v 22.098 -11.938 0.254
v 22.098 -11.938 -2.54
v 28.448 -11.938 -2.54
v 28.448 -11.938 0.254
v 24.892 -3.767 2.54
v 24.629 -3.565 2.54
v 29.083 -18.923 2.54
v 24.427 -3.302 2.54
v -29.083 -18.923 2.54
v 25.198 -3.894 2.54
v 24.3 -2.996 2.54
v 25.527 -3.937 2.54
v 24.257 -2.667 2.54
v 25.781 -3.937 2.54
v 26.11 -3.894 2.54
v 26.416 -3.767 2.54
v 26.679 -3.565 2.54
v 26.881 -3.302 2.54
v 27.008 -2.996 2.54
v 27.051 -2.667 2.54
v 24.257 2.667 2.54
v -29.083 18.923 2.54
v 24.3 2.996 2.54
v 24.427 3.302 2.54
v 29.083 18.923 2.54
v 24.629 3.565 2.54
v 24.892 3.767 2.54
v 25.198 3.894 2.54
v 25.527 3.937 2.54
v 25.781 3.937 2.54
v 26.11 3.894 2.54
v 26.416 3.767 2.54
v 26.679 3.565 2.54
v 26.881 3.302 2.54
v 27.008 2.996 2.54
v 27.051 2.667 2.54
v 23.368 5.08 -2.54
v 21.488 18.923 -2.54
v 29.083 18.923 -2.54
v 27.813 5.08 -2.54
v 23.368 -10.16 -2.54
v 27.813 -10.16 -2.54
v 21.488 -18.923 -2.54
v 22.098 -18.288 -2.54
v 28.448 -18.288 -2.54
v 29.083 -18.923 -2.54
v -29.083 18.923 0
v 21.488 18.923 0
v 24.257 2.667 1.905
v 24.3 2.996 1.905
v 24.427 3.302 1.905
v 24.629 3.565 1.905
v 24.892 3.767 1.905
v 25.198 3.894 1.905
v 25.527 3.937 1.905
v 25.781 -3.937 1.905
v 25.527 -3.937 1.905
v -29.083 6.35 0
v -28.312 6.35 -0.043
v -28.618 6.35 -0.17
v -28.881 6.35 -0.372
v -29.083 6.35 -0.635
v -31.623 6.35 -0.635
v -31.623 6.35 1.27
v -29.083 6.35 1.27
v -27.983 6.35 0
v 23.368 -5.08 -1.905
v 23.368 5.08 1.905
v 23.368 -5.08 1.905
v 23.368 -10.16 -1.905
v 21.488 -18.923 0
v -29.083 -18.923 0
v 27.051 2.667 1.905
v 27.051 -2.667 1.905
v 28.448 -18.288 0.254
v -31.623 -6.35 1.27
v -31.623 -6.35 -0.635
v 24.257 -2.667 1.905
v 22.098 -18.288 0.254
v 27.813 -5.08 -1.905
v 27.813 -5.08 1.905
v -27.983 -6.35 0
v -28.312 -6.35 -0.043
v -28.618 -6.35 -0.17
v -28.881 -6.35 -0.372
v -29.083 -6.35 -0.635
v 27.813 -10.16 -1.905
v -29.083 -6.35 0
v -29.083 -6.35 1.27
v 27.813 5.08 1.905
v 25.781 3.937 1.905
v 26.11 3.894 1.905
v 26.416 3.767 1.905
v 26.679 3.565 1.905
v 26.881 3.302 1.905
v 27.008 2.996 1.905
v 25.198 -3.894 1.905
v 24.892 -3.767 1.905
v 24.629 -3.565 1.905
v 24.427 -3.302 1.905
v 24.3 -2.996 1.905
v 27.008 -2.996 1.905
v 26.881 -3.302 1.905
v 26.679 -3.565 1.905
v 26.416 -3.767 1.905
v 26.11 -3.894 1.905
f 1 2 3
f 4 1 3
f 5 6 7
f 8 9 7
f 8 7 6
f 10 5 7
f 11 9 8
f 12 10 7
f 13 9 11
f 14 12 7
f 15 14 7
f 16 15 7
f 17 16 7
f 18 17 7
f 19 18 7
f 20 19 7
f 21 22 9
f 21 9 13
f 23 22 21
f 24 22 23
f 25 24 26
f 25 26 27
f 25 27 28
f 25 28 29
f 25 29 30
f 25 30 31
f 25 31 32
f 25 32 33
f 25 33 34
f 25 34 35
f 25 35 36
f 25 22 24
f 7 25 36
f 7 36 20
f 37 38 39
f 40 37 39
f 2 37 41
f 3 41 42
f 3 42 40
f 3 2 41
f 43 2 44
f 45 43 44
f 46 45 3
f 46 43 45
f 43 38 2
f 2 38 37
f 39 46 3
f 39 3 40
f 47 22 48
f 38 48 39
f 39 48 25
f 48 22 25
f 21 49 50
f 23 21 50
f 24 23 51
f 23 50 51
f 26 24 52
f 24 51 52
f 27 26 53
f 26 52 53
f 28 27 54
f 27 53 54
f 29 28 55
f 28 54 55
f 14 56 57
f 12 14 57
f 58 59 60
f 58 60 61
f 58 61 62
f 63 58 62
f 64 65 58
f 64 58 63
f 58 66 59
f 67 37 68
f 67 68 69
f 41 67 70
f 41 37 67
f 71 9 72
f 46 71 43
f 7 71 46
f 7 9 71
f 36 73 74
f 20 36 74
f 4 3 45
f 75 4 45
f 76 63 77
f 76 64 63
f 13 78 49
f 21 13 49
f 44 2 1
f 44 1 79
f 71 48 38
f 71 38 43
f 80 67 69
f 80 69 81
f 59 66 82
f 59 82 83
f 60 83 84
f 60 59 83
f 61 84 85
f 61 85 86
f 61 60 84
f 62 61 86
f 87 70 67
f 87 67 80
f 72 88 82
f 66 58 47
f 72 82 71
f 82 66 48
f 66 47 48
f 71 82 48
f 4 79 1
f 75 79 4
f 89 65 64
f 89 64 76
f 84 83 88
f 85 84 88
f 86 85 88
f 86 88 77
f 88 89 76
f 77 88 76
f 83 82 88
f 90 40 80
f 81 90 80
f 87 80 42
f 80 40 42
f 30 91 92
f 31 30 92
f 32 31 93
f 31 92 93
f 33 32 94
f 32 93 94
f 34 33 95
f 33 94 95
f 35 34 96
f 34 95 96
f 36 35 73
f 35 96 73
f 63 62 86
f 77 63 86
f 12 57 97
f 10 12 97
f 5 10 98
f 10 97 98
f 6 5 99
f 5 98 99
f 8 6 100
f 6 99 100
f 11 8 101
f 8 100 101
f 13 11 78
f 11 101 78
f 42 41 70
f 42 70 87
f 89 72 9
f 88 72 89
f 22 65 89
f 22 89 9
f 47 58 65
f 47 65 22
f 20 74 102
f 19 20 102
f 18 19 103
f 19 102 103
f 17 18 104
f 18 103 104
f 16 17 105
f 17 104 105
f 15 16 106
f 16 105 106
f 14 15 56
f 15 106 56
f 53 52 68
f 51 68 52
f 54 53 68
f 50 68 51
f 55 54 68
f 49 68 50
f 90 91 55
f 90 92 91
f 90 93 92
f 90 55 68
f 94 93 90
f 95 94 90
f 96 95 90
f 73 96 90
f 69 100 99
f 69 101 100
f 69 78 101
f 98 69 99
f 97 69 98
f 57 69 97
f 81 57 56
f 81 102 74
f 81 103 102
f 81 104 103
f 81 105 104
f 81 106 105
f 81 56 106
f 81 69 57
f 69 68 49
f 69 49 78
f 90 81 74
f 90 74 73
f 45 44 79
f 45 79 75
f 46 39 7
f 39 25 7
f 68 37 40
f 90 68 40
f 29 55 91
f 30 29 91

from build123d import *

# Parameters (mm, degrees)
F0_W        = 58.166
F0_H        = 37.846
F1_DEPTH    = 2.54
F2_W        = 7.5946
F2_H        = 37.846
F3_DEPTH    = 2.54
F4_W        = 12.7
F4_H        = 0.635
F4_H_2      = 1.27
F5_DEPTH    = 2.54
F6_T1_DEPTH = 12.7
F7_W        = 4.445
F7_H        = 10.16
F8_DEPTH    = 4.445
F9_W        = 4.445
F9_H        = 5.08
F10_DEPTH   = 0.635
F12_DEPTH   = 0.635
F13_W       = 6.35
F13_H       = 6.35
F14_DEPTH   = 2.794


# Not quite as in the source:
# - a fillet or chamfer that OpenCascade refuses, or shapes differently, is made with other operations: its cross-section is extruded or revolved along the edge and cut away or added


with BuildPart() as f1:
    # F0 (on Top) → F1 (new body)
    with BuildSketch(Plane.XY):
        Rectangle(F0_W, F0_H)
    extrude(amount=F1_DEPTH)

    # F2 (on face) → F3 (join)
    with BuildSketch(Plane(origin=(0, 0, 0), x_dir=(1, 0, 0), z_dir=(0, 0, -1))):
        with Locations((25.2857, 0)):
            Rectangle(F2_W, F2_H)
    extrude(amount=F3_DEPTH)

    # F4 (on face) → F5 (join)
    with BuildSketch(Plane(origin=(-29.083, 0, 0), x_dir=(0, -1, 0), z_dir=(-1, 0, 0))):
        with Locations((0, -0.3175)):
            Rectangle(F4_W, F4_H)
        with Locations((0, 0.635)):
            Rectangle(F4_W, F4_H_2)
    extrude(amount=F5_DEPTH)

    # F6: fillet of radius 1.27 on 1 edges, made by hand

    # F6_s2 → F6_t1 (join)
    with BuildSketch(Plane.XZ.offset(-6.35)):
        with BuildLine():
            ThreePointArc((-27.9831477372, 0), (-28.6181477372, -0.1701477372), (-29.083, -0.635))
            Line((-29.083, -0.635), (-29.083, 0))
            Line((-29.083, 0), (-27.9831477372, 0))
        make_face()
    extrude(amount=F6_T1_DEPTH)

    # F7 (on face) → F8 (cut)
    with BuildSketch(Plane(origin=(0, 0, -2.54), x_dir=(1, 0, 0), z_dir=(0, 0, -1))):
        with Locations((25.5905, 0)):
            Rectangle(F7_W, F7_H)
    extrude(amount=-F8_DEPTH, mode=Mode.SUBTRACT)

    # F9 (on face) → F10 (cut)
    with BuildSketch(Plane(origin=(0, 0, -2.54), x_dir=(1, 0, 0), z_dir=(0, 0, -1))):
        with Locations((25.5905, 7.62)):
            Rectangle(F9_W, F9_H)
    extrude(amount=-F10_DEPTH, mode=Mode.SUBTRACT)

    # F11 (on face) → F12 (cut, through all)
    with BuildSketch(Plane(origin=(0, 0, 1.905), x_dir=(1, 0, 0), z_dir=(0, 0, -1))):
        with BuildLine():
            Line((25.527, -3.937), (25.781, -3.937))
            ThreePointArc((25.781, -3.937), (26.6790256121, -3.5650256121), (27.051, -2.667))
            Line((27.051, -2.667), (27.051, 2.667))
            ThreePointArc((27.051, 2.667), (26.6790256121, 3.5650256121), (25.781, 3.937))
            Line((25.781, 3.937), (25.527, 3.937))
            ThreePointArc((25.527, 3.937), (24.6289743879, 3.5650256121), (24.257, 2.667))
            Line((24.257, 2.667), (24.257, -2.667))
            ThreePointArc((24.257, -2.667), (24.6289743879, -3.5650256121), (25.527, -3.937))
        make_face()
    extrude(amount=-F12_DEPTH, mode=Mode.SUBTRACT)

    # F13 (on face) → F14 (cut)
    with BuildSketch(Plane(origin=(0, 0, -2.54), x_dir=(1, 0, 0), z_dir=(0, 0, -1))):
        with Locations((25.273, 15.113)):
            Rectangle(F13_W, F13_H)
    extrude(amount=-F14_DEPTH, mode=Mode.SUBTRACT)


solid = f1.part
